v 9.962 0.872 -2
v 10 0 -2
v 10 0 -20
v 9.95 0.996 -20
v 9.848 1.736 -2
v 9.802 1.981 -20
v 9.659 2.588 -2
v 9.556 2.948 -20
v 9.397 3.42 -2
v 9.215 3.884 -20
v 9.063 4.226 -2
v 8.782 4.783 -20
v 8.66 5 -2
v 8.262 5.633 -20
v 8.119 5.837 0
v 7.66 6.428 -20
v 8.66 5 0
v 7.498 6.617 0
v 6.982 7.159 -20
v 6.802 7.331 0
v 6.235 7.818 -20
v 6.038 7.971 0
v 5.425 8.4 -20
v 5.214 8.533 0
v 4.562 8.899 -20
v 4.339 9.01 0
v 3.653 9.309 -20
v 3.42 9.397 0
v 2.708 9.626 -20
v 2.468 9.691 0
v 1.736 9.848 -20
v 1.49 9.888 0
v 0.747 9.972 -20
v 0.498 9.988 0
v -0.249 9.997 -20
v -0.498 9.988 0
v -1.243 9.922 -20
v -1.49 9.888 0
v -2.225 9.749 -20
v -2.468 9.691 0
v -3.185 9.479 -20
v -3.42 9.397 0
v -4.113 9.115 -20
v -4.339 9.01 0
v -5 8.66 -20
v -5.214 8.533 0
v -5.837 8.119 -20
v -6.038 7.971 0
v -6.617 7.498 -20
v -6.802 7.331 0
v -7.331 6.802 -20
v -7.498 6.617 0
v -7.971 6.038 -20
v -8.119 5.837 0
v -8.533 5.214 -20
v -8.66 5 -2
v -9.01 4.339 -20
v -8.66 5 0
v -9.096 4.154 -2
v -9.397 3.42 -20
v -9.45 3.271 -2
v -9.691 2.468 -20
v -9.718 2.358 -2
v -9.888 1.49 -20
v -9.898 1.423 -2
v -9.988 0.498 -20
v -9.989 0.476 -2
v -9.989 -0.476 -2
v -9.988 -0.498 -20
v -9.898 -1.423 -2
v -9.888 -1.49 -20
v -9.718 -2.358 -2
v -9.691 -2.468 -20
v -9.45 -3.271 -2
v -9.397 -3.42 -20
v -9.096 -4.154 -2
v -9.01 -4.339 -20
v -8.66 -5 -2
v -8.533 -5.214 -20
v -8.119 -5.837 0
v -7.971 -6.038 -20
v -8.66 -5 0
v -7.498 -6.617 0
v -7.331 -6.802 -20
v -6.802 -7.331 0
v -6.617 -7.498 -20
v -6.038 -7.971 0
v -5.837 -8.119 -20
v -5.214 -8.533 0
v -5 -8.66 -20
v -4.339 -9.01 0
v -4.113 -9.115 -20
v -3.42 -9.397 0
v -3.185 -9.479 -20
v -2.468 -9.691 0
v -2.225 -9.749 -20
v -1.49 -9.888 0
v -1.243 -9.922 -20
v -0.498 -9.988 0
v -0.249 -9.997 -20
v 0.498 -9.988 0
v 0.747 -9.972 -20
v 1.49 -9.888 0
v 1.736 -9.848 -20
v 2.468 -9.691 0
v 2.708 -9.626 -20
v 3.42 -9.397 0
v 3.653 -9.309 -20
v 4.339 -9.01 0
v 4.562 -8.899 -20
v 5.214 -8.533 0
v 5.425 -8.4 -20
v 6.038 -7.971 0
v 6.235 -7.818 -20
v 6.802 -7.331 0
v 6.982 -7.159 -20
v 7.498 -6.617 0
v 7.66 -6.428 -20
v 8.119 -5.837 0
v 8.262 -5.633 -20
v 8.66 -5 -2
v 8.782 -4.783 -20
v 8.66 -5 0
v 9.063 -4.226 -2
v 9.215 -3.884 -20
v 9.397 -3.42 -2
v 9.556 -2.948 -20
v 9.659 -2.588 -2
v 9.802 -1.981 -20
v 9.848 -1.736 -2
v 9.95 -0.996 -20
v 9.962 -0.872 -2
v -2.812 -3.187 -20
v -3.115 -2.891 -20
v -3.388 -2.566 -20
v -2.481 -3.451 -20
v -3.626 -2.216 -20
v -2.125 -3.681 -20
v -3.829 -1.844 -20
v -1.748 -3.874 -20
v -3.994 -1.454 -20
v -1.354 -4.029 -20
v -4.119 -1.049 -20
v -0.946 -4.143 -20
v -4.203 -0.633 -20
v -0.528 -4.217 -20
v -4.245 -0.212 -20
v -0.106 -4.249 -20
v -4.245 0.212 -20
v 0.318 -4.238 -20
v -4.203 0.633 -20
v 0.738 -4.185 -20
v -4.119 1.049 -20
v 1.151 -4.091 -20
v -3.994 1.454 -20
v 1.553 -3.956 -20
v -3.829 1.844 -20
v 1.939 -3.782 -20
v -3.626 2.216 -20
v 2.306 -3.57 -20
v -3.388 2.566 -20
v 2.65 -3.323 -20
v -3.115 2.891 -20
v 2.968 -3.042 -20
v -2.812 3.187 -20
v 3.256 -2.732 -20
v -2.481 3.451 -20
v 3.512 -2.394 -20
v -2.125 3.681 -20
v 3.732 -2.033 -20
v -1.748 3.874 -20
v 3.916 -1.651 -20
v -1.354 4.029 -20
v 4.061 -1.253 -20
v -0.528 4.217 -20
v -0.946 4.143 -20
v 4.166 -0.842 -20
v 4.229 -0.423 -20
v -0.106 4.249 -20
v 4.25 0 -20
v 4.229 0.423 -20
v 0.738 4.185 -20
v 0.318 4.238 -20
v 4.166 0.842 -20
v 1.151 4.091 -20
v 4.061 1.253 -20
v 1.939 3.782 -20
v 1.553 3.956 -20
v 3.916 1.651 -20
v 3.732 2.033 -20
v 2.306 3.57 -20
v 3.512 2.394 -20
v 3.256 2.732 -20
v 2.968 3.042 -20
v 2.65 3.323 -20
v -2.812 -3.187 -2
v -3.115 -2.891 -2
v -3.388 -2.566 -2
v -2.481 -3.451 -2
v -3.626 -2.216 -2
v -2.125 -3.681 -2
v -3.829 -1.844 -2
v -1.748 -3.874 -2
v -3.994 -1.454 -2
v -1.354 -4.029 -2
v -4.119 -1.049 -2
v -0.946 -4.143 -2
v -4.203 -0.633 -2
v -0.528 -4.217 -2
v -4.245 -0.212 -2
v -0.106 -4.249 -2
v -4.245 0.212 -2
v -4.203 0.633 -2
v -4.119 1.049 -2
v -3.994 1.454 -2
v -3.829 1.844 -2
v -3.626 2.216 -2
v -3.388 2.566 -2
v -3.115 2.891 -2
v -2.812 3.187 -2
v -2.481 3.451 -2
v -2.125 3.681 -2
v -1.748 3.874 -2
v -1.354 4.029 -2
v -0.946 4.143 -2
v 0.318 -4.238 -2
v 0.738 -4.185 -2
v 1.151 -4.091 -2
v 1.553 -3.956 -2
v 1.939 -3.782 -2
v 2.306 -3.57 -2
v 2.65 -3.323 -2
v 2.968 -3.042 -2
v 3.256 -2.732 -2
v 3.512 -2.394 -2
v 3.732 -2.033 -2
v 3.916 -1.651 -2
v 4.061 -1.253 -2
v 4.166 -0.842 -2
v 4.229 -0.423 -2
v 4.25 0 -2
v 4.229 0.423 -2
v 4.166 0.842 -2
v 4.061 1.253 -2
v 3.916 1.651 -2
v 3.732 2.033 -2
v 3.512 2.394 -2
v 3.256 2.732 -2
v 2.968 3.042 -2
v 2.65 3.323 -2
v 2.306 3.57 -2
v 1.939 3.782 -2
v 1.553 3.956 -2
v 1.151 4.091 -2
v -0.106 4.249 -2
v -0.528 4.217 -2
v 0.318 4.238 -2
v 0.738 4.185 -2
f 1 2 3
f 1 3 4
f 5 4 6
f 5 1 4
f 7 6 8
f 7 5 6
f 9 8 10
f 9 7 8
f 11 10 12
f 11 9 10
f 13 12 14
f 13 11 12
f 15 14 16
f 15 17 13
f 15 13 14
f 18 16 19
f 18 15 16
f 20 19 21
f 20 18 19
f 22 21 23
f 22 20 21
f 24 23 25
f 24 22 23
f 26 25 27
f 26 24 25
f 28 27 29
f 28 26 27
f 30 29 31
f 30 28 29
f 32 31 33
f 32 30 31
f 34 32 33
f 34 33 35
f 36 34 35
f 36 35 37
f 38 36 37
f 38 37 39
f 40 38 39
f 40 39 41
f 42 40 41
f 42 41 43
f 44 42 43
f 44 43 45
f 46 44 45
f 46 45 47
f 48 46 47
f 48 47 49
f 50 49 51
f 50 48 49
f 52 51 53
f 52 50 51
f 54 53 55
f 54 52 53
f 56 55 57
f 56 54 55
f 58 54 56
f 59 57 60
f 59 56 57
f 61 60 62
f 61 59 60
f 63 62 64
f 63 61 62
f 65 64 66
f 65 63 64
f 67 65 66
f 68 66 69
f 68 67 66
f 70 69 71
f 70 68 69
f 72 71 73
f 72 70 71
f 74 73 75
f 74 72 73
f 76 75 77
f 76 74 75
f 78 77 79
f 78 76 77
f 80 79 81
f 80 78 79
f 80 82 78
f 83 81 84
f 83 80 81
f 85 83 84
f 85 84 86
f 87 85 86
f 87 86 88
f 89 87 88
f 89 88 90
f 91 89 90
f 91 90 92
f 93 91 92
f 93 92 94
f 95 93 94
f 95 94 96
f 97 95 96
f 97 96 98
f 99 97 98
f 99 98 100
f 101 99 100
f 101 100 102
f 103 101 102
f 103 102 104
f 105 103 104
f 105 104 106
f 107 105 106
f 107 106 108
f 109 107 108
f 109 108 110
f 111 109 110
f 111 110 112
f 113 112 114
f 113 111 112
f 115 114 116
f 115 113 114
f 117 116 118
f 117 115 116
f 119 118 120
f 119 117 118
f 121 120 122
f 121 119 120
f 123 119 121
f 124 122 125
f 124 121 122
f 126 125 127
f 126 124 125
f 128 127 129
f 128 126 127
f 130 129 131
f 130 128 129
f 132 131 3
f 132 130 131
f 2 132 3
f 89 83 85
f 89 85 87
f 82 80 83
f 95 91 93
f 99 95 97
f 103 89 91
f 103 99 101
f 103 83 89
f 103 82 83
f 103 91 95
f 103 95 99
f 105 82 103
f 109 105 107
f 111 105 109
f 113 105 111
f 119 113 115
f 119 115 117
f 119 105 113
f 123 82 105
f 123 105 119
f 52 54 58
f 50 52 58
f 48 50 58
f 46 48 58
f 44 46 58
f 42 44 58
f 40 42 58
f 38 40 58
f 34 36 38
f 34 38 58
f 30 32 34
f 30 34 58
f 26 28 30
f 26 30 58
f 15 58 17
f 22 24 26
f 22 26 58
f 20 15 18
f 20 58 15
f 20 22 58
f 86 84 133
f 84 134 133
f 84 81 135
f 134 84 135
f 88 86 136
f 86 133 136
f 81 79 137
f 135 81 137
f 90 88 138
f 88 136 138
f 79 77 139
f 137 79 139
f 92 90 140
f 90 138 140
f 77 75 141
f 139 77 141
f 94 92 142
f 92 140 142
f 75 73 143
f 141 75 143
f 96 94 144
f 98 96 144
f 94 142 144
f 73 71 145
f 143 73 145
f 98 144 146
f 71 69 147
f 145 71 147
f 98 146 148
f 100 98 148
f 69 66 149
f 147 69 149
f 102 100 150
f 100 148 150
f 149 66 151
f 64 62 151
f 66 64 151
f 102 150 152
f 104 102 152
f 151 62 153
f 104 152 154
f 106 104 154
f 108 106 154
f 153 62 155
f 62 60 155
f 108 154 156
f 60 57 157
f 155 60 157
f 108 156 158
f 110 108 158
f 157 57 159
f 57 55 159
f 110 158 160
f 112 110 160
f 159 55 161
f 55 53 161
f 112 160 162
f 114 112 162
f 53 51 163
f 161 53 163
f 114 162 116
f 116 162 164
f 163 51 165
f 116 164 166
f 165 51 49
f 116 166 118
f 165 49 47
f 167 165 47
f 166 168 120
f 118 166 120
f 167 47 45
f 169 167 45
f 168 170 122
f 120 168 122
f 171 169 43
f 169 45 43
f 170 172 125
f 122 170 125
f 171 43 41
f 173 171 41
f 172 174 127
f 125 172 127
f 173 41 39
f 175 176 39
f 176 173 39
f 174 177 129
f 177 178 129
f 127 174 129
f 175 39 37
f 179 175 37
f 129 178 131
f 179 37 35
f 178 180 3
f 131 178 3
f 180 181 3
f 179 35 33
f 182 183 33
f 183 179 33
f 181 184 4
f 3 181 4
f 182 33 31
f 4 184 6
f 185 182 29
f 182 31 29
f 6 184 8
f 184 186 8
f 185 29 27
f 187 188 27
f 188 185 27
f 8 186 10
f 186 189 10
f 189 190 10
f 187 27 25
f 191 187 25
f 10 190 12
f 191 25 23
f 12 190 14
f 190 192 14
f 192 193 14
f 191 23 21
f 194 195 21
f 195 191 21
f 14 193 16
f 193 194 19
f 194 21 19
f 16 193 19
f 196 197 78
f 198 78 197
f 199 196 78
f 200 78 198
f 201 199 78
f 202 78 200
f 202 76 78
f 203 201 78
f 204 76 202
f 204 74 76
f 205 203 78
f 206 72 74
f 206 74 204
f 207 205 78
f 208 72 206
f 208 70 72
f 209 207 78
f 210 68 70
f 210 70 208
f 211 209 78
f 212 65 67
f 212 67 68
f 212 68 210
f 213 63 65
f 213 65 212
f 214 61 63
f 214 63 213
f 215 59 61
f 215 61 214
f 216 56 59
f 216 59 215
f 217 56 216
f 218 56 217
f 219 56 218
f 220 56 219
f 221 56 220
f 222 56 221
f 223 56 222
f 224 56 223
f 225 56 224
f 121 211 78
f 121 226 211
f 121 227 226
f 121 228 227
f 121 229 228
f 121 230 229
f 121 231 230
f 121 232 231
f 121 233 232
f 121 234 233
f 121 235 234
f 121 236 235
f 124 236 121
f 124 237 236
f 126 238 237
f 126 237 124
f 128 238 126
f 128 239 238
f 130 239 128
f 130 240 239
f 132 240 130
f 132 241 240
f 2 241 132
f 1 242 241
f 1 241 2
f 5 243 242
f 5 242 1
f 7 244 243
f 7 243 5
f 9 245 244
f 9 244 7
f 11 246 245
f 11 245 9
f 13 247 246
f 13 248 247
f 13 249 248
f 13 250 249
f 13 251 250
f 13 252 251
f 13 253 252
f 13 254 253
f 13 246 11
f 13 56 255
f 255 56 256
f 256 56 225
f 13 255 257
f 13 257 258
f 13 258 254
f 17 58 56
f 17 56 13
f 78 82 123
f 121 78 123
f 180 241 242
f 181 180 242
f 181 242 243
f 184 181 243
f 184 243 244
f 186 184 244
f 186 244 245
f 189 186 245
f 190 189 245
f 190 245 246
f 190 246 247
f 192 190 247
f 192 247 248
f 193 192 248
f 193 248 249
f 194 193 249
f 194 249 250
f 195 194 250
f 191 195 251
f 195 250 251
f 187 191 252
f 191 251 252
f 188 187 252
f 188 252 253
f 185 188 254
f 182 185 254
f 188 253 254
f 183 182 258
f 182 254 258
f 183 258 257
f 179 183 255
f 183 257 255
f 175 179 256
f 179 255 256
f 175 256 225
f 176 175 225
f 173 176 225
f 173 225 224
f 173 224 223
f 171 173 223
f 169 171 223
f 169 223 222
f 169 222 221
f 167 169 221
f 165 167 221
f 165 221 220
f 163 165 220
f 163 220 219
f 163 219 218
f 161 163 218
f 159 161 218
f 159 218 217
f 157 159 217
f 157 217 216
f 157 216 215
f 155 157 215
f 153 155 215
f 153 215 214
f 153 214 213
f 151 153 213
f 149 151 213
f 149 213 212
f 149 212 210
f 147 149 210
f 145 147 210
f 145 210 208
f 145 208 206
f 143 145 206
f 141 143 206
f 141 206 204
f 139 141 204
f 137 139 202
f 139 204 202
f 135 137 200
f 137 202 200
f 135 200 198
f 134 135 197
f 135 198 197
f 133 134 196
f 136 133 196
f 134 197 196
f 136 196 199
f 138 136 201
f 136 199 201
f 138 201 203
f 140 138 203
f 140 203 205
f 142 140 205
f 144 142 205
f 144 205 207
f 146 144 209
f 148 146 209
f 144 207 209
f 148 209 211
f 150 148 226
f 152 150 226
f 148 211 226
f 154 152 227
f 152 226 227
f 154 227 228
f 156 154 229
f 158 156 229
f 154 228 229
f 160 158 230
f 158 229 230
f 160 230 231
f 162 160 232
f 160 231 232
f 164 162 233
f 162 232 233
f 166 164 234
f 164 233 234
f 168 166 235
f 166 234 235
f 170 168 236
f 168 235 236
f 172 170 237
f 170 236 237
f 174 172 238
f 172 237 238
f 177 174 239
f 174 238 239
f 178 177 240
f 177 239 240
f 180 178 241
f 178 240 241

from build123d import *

# Parameters (mm, degrees)
F0_R     = 10
F1_DEPTH = 20
F2_R     = 4.25
F3_DEPTH = 20.001
F4_W     = 23.145964
F4_H     = 10
F5_DEPTH = 2


with BuildPart() as f1:
    # F0 (on Top) → F1 (new body)
    with BuildSketch(Plane.XY):
        Circle(F0_R)
    extrude(amount=-F1_DEPTH)

    # F2 (on Top) → F3 (cut, through all)
    with BuildSketch(Plane.XY):
        Circle(F2_R)
    extrude(amount=-F3_DEPTH, mode=Mode.SUBTRACT)

    # F4 (on face) → F5 (cut)
    with BuildSketch(Plane.XY):
        Rectangle(F4_W, F4_H)
    extrude(amount=-F5_DEPTH, mode=Mode.SUBTRACT)


solid = f1.part
